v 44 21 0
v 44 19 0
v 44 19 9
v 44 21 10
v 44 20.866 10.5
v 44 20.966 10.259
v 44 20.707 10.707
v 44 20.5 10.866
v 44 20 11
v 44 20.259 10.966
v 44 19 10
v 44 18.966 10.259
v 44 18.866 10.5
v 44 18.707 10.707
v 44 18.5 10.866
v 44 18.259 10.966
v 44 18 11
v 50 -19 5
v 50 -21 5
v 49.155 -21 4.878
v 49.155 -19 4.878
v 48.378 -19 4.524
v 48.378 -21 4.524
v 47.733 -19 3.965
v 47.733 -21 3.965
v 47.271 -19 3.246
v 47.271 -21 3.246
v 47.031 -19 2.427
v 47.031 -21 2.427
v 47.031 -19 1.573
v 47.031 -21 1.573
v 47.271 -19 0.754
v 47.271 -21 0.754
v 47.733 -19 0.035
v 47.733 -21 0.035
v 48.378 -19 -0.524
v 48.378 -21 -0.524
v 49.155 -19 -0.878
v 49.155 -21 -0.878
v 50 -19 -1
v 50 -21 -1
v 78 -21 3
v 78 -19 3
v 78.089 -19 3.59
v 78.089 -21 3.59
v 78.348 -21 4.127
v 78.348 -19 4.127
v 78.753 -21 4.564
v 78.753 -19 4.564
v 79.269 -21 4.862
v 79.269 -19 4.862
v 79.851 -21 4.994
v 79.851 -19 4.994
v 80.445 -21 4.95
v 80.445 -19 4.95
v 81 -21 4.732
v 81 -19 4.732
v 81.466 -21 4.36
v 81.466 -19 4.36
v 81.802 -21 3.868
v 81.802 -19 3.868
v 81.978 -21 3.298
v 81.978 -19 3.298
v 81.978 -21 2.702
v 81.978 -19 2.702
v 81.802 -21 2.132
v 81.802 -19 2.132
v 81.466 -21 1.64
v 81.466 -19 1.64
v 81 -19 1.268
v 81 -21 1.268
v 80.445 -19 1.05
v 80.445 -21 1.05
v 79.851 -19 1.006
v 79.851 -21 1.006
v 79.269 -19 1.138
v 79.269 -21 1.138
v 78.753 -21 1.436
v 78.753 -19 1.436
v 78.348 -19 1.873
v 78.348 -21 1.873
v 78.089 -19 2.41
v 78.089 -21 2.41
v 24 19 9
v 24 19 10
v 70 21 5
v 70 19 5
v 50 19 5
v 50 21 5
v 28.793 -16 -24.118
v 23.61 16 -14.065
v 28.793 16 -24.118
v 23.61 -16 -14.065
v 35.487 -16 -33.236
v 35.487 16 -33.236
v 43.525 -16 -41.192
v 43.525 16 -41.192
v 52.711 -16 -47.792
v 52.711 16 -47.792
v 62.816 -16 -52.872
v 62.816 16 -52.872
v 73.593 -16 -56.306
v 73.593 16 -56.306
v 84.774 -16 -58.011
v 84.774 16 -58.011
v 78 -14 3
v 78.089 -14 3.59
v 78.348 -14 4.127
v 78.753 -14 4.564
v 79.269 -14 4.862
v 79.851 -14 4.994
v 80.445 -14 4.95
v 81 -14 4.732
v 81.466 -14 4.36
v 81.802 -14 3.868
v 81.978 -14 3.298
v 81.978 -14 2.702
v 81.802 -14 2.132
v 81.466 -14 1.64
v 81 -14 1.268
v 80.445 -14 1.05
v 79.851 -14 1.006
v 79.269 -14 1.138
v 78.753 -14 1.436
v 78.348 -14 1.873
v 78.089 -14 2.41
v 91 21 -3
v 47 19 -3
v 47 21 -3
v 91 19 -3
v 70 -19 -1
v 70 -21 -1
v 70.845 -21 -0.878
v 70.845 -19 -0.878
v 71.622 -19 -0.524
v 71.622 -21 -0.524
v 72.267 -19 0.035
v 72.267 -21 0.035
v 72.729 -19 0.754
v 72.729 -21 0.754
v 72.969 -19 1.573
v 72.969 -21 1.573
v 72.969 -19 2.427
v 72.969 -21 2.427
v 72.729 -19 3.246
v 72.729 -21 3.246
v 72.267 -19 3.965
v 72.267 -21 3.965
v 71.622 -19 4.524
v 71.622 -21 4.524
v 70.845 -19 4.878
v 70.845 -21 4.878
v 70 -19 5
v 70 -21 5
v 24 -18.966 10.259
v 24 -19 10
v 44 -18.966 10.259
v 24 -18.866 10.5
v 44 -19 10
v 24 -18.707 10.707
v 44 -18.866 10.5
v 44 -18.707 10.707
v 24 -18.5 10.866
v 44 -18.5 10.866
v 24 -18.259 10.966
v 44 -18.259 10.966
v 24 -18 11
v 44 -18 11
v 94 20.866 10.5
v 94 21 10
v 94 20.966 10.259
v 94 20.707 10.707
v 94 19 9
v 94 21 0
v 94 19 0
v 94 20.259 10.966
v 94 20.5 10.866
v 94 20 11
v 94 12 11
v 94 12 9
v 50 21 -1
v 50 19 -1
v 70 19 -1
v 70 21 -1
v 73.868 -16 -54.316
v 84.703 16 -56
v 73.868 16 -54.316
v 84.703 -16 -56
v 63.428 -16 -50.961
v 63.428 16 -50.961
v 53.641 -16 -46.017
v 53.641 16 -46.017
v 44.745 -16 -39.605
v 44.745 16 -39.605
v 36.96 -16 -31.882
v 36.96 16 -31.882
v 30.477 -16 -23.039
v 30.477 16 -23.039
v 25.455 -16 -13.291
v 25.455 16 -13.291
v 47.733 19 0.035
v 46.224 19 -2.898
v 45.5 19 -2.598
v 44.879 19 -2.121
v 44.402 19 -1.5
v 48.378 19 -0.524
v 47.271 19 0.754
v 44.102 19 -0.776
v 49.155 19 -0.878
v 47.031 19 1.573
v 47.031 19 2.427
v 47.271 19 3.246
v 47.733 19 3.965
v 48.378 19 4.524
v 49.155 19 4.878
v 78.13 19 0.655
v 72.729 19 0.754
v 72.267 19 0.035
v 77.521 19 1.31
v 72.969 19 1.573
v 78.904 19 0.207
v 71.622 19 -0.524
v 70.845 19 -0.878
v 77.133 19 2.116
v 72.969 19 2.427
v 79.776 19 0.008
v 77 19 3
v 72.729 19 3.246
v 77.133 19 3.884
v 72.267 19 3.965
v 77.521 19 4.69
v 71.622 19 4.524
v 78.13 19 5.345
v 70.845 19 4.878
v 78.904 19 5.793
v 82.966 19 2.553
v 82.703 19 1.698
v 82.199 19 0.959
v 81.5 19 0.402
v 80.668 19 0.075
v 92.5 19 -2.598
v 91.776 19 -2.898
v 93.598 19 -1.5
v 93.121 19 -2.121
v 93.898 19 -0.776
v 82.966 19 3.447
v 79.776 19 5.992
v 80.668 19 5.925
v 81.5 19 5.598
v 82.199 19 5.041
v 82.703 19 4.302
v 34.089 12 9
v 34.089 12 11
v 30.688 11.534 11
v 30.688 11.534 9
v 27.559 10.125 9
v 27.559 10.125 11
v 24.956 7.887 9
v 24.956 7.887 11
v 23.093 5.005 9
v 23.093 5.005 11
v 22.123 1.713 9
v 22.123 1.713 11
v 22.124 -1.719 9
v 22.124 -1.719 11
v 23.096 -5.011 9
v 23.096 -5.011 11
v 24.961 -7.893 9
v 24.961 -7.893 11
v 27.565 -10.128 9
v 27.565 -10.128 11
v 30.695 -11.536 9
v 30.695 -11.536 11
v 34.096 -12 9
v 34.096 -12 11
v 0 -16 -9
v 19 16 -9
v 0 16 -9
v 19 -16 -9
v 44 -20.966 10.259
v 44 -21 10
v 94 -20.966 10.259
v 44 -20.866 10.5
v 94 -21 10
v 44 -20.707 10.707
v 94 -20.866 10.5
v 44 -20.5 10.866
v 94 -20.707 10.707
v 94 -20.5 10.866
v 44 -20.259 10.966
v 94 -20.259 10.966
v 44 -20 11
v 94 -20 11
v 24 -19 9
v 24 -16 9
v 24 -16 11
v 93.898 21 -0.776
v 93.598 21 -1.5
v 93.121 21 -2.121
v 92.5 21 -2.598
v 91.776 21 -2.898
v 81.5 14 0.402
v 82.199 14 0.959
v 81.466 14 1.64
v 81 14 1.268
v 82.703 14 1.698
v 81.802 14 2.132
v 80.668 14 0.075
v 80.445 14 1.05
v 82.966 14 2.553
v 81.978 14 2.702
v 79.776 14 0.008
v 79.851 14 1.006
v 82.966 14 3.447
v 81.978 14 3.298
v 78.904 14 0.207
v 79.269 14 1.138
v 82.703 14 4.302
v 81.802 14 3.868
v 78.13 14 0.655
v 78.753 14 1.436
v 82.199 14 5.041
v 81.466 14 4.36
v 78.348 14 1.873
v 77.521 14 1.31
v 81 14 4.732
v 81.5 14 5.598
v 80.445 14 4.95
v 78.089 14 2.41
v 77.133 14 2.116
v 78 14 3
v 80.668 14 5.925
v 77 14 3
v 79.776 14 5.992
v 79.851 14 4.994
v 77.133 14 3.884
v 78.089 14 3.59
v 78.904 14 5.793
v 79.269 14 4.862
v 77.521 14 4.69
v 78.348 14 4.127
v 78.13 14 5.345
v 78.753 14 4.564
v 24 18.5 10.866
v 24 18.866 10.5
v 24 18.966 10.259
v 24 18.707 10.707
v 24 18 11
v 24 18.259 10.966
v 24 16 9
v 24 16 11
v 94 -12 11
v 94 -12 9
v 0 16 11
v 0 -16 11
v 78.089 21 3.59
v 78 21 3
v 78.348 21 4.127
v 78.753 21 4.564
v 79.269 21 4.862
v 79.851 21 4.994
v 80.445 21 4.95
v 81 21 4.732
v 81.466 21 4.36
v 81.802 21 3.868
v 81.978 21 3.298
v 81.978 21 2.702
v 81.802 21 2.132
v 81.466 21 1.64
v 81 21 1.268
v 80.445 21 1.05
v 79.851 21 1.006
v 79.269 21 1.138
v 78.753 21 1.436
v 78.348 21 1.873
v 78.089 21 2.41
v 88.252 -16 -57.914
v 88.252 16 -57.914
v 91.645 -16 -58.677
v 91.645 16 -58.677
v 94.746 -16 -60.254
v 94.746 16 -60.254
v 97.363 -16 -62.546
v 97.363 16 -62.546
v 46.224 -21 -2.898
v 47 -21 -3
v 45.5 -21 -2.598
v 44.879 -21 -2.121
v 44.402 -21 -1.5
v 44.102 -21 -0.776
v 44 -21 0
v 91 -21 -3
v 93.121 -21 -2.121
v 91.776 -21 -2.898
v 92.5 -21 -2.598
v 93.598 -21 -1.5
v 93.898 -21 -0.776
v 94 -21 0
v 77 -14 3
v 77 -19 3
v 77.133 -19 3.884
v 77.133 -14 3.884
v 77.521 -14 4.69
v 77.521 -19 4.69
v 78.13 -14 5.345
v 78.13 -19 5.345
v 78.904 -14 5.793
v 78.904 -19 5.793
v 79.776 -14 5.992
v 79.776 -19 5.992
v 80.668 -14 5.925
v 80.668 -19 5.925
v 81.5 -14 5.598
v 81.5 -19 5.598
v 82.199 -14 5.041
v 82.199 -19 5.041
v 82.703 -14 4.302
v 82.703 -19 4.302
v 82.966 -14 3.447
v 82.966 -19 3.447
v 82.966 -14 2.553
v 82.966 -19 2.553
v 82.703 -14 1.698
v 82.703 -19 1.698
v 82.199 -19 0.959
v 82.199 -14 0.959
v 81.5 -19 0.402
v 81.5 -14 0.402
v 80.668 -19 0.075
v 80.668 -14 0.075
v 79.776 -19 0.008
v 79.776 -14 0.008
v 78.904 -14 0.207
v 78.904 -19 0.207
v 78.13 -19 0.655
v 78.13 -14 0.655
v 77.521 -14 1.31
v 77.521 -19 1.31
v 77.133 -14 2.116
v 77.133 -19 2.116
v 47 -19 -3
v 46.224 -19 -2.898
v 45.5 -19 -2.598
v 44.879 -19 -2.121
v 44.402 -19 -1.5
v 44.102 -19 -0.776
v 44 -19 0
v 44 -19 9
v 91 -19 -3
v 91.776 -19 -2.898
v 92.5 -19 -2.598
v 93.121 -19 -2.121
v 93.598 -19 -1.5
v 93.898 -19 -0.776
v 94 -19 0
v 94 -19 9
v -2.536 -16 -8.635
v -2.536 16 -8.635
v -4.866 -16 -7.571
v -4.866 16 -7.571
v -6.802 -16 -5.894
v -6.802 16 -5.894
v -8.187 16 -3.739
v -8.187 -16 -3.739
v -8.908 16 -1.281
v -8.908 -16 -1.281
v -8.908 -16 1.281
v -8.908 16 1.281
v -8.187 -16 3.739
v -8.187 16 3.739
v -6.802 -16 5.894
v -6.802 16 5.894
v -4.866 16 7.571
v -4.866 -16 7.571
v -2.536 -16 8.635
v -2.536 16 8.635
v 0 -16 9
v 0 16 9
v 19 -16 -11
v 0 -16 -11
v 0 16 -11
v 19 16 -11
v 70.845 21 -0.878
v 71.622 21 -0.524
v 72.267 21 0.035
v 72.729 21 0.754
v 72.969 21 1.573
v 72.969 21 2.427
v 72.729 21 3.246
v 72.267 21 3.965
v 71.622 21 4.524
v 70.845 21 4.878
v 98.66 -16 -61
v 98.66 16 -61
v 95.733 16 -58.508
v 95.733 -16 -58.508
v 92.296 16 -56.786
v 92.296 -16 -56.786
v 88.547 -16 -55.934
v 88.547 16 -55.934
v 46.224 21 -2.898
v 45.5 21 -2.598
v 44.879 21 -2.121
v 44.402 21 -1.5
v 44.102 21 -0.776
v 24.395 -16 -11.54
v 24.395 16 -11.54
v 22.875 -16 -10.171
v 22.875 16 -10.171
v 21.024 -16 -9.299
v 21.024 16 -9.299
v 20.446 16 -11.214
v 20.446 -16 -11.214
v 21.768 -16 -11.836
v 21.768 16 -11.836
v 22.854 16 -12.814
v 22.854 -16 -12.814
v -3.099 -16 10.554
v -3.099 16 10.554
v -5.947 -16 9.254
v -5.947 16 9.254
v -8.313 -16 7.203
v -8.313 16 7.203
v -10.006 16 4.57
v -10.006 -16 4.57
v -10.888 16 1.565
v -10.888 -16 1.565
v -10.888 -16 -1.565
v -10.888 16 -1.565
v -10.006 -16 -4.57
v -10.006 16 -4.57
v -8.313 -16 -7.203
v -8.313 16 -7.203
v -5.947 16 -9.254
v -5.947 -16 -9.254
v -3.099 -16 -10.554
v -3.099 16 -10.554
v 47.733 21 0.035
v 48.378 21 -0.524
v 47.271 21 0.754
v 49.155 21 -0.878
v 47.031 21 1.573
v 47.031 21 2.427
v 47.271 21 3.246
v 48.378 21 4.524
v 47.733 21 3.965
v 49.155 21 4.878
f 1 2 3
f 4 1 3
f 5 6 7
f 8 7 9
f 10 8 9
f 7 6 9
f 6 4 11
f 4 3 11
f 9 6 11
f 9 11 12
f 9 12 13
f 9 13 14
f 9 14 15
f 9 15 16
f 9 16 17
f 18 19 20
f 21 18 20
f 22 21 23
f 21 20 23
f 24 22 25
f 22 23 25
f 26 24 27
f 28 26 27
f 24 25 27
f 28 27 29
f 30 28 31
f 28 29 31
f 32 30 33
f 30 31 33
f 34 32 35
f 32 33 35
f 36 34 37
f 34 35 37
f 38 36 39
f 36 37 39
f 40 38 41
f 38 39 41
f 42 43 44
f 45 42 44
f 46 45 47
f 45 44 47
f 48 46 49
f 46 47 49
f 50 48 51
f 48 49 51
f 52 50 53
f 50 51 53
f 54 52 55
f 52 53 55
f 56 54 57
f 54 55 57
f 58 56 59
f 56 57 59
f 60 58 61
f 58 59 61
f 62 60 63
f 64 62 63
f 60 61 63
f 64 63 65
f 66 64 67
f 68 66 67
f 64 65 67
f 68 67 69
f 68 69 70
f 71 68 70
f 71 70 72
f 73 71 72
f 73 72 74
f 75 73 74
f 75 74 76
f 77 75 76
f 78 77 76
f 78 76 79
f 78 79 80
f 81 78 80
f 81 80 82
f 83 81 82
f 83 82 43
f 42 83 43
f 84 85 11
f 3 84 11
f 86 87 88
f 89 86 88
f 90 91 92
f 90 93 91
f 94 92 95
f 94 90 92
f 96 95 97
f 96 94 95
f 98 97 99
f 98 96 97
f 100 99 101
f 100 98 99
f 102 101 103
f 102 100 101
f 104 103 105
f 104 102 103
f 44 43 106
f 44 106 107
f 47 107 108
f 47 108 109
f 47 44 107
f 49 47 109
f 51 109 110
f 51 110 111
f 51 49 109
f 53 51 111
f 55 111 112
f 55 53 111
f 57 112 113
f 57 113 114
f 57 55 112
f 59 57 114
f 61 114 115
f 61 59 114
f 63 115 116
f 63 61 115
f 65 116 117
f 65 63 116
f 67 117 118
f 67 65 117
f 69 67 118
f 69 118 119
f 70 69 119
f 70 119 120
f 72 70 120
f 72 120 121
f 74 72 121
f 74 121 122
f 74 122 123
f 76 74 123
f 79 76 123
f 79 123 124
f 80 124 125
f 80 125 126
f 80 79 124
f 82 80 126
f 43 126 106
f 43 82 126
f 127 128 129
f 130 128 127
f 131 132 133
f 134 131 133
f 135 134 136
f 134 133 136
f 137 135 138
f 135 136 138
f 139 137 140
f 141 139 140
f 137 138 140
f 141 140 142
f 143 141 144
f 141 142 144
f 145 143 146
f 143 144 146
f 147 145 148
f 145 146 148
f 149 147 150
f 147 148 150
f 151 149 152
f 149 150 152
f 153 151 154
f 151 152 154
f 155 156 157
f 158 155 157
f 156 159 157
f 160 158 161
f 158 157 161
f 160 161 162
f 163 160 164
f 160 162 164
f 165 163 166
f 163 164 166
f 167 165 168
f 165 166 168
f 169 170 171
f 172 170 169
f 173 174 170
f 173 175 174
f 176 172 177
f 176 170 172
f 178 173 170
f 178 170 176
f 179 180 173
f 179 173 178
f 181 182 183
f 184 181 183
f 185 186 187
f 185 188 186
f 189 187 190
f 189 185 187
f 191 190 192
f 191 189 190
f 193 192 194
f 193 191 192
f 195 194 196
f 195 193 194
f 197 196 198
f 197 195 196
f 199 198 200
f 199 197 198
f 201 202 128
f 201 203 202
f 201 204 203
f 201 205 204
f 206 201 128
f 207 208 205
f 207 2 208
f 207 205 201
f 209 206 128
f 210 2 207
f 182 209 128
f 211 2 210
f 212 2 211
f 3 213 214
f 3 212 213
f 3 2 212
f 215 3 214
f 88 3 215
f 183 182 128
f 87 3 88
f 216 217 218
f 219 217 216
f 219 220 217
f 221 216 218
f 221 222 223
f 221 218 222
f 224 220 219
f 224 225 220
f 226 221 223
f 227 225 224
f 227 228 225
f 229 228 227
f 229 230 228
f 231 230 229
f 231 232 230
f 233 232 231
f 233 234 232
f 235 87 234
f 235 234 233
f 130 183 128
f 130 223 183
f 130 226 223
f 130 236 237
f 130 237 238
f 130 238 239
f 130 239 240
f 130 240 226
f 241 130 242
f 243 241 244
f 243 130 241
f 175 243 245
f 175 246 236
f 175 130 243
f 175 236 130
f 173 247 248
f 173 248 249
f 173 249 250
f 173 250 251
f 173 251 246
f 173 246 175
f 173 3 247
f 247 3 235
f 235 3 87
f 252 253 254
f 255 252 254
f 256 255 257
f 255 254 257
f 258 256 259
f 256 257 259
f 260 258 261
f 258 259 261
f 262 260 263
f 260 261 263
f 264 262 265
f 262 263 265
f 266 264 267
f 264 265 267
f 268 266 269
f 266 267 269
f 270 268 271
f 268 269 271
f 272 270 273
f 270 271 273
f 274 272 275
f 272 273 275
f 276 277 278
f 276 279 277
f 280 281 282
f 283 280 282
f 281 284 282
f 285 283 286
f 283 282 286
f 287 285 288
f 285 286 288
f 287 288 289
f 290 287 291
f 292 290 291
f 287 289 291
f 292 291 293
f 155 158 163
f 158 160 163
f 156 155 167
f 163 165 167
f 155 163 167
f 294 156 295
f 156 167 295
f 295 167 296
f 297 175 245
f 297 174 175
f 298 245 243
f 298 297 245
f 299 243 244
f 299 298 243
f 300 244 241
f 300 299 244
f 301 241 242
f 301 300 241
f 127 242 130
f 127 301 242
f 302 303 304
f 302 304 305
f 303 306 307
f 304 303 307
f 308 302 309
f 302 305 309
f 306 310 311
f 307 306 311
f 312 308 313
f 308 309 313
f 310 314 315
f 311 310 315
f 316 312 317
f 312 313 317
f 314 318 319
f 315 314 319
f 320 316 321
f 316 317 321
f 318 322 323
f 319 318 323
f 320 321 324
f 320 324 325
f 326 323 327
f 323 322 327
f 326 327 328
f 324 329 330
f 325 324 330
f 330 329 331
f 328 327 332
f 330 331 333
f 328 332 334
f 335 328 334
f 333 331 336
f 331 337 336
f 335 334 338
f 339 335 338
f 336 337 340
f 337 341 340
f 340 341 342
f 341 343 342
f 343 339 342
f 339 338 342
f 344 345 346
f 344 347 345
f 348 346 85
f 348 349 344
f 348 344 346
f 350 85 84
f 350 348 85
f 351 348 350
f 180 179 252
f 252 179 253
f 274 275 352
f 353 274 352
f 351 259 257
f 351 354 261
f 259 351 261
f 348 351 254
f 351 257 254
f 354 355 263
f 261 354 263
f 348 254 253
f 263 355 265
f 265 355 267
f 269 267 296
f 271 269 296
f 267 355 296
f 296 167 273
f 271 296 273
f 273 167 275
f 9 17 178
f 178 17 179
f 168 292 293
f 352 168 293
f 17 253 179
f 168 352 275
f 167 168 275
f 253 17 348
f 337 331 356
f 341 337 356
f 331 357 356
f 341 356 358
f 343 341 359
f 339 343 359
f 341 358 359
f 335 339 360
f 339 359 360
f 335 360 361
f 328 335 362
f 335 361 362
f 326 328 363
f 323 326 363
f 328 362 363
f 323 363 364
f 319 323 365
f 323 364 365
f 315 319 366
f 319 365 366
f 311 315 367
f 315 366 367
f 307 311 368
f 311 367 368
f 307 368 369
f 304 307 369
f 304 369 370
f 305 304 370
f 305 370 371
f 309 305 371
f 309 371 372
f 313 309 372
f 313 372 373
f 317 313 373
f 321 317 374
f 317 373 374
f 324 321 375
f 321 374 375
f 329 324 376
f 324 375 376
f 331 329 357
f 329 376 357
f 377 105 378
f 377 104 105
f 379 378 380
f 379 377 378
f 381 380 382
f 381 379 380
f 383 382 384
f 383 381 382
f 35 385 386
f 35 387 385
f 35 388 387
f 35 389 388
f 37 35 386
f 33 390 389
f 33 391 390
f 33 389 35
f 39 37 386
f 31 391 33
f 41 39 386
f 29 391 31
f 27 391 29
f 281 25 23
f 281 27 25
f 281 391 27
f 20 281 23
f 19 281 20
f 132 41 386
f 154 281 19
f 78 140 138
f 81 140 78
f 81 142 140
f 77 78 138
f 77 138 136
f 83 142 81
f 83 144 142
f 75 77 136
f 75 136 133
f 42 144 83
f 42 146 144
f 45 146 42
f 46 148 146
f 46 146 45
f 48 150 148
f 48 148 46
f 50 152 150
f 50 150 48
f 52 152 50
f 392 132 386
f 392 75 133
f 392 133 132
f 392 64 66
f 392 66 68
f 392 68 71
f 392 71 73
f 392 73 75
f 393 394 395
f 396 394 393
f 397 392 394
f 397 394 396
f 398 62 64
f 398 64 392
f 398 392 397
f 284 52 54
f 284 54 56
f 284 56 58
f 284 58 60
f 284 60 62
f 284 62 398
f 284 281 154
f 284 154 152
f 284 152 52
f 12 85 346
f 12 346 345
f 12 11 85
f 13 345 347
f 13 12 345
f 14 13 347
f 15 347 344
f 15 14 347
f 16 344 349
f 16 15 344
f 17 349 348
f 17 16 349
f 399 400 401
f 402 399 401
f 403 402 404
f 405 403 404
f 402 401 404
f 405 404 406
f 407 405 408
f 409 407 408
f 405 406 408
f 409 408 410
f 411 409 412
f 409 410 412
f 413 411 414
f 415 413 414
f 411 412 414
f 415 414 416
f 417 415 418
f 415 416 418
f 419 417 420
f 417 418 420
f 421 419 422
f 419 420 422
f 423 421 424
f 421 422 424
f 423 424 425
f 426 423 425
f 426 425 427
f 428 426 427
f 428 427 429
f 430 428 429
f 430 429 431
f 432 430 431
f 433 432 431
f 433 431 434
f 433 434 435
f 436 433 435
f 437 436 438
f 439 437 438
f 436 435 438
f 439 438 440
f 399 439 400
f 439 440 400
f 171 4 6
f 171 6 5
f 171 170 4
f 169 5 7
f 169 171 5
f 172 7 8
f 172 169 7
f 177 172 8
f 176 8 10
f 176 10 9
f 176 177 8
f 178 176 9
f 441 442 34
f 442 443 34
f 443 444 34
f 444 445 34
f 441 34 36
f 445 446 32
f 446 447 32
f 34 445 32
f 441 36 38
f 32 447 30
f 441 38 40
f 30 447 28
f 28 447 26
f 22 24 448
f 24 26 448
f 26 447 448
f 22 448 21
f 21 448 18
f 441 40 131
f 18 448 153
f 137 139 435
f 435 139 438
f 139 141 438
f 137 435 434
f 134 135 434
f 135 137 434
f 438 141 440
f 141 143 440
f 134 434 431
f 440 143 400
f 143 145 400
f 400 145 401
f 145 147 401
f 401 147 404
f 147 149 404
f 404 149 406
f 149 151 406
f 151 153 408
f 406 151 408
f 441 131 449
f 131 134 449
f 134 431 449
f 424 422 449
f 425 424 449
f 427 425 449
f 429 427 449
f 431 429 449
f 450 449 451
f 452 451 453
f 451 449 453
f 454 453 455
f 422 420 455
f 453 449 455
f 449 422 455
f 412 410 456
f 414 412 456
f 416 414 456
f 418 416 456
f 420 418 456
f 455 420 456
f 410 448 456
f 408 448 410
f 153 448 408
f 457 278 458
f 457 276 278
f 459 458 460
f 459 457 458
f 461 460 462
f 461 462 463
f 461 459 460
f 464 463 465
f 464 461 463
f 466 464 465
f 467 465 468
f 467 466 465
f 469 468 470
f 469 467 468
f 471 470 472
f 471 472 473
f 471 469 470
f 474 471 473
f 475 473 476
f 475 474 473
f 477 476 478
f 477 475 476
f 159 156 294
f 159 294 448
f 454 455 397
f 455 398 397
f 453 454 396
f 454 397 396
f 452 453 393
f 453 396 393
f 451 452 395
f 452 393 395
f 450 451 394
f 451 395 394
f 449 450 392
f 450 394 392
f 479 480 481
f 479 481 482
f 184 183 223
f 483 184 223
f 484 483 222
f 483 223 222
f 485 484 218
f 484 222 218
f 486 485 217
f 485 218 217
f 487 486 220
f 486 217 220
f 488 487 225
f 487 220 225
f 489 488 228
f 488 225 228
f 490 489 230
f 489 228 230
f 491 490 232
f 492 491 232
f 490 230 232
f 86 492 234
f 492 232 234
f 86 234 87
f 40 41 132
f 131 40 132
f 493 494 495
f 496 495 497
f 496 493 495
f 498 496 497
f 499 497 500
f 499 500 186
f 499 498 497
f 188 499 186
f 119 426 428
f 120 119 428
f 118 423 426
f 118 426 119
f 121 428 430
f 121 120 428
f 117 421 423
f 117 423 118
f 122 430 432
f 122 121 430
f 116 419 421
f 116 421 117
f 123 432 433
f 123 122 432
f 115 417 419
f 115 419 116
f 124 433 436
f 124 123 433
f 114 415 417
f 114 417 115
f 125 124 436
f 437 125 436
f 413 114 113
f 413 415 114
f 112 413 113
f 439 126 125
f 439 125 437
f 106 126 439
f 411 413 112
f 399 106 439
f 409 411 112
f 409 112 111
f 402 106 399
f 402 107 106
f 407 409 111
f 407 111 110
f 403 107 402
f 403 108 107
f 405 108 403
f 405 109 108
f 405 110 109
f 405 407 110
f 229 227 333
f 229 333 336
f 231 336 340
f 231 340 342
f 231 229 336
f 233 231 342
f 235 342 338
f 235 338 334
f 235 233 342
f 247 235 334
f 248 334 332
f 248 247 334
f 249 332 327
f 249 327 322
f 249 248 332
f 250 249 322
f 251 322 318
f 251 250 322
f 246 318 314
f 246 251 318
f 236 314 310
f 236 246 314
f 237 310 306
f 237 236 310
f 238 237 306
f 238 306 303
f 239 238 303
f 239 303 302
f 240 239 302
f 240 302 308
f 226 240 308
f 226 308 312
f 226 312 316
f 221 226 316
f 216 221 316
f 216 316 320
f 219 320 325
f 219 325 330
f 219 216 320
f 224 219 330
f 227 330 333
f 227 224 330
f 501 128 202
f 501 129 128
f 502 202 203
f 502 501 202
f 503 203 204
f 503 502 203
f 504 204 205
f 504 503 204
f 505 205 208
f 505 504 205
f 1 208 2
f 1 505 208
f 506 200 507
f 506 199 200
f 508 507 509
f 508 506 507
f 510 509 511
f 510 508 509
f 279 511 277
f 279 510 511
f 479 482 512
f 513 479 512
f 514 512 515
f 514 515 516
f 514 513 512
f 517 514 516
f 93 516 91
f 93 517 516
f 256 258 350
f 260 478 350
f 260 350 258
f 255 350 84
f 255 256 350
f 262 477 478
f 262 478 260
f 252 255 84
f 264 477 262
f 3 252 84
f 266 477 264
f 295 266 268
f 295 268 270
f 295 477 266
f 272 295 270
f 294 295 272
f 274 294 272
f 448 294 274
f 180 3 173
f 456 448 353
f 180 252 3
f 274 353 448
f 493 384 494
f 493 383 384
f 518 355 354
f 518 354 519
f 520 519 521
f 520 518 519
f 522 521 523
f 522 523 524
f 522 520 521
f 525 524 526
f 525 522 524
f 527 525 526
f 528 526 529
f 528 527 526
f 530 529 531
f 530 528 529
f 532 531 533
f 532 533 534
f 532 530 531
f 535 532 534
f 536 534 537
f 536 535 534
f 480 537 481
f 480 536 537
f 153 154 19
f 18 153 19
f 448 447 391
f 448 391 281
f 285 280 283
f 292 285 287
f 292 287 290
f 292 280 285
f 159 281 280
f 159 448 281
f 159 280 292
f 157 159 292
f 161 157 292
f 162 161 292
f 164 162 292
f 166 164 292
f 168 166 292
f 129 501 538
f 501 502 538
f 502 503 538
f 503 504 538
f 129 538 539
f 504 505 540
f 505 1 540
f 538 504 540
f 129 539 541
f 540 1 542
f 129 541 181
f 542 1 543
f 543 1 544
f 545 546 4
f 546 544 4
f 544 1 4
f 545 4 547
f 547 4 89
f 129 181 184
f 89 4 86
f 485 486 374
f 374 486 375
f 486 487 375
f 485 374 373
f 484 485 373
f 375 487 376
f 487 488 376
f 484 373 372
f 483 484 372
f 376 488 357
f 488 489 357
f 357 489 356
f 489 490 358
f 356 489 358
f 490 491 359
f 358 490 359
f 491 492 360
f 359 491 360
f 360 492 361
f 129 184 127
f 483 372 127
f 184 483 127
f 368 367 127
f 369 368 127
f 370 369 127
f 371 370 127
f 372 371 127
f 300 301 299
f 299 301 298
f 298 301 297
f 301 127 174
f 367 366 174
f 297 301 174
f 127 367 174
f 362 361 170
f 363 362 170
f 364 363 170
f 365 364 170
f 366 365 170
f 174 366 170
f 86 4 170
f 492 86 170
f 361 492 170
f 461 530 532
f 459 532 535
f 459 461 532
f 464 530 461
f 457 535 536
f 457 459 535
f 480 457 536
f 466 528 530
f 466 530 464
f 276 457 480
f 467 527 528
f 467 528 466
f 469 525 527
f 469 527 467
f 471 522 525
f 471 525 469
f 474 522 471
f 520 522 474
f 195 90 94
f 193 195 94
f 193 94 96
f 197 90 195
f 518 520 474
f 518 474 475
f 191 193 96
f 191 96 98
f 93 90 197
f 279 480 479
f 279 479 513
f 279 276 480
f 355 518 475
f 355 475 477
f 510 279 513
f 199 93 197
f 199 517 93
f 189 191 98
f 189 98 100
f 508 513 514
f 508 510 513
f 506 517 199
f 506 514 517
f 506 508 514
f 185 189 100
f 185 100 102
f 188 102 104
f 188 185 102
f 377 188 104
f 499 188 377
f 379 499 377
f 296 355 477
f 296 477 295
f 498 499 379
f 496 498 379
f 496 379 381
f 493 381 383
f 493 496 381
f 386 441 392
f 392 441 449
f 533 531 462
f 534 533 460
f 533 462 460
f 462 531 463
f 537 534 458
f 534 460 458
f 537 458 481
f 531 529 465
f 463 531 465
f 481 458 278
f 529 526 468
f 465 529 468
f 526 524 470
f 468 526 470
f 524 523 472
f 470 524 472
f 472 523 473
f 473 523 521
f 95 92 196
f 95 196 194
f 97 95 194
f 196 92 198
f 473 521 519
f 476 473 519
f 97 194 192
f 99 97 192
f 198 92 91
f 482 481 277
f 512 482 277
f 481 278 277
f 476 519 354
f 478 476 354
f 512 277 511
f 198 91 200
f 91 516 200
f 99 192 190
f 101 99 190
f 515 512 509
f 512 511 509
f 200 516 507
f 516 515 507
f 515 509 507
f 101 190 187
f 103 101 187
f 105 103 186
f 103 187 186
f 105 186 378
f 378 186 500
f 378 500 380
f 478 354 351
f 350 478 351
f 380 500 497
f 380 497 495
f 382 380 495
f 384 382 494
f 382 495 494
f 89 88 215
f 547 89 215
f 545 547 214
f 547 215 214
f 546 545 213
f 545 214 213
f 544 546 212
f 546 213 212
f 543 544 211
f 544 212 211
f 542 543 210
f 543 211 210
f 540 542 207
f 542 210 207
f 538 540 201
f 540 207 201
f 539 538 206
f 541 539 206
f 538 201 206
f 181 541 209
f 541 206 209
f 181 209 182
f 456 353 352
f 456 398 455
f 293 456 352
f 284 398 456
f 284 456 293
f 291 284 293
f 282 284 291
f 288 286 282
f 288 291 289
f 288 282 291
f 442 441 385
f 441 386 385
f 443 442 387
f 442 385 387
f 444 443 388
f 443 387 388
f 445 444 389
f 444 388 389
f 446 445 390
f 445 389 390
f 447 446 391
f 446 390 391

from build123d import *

# Parameters (mm, degrees)
F1_DEPTH  = 16
F2_W      = 70
F2_H      = 3
F3_DEPTH  = 2
F4_W      = 50
F4_H      = 14
F5_DEPTH  = 2
F6_R      = 1
F9_DEPTH  = 2
F11_DEPTH = 42.001
F13_D     = 4
F14_R     = 3
F14_R_2   = 2
F15_DEPTH = 5
F16_R     = 3


# Not quite as in the source:
# - a pattern or mirror of a feature is missing from the dataset's text; its kind, count and spacing are read off the source's solid


with BuildPart() as f1:
    # F0 (on Front) → F1 (new body)
    with BuildSketch(Plane.XZ):
        with BuildLine():
            Line((94, 11), (0, 11))
            ThreePointArc((0, 11), (-11, 0), (0, -11))
            Line((0, -11), (19, -11))
            ThreePointArc((19, -11), (21.7681124643, -11.8361612201), (23.6103896104, -14.064978646))
            ThreePointArc((23.6103896104, -14.064978646), (47.9882051962, -44.6729645648), (84.7744660979, -58.0107943585))
            ThreePointArc((84.7744660979, -58.0107943585), (91.6454906811, -58.677418602), (97.362645896, -62.5464627931))
            Line((97.362645896, -62.5464627931), (98.6602822553, -61))
            ThreePointArc((98.6602822553, -61), (92.2959119196, -56.7859373435), (84.7034264019, -56))
            ThreePointArc((84.7034264019, -56), (49.0672193413, -42.9854179344), (25.4545454545, -13.2909701044))
            ThreePointArc((25.4545454545, -13.2909701044), (22.87535745, -10.1706257081), (19, -9))
            Line((19, -9), (0, -9))
            ThreePointArc((0, -9), (-9, 0), (0, 9))
            Line((0, 9), (94, 9))
            Line((94, 9), (94, 11))
        make_face()
    extrude(amount=F1_DEPTH)

    # F2 (on face) → F3 (join)
    with BuildSketch(Plane.XY.offset(11)):
        with Locations((59, -17.5)):
            Rectangle(F2_W, F2_H)
    extrude(amount=-F3_DEPTH)

    # F4 (on face) → F5 (join)
    with BuildSketch(Plane.XZ.offset(19)):
        with Locations((69, 4)):
            Rectangle(F4_W, F4_H)
    extrude(amount=F5_DEPTH)

    # F6
    f6_edges = [f1.edges().sort_by_distance(p)[0] for p in [
        (69, -21, 11),
        (34, -19, 11),
    ]]
    fillet(f6_edges, radius=F6_R)

    # F7: F1 across plane


with BuildPart() as f1_1:
    add(f1.part)
    add(f1.part.mirror(Plane.XZ))

    # F8 (on face) → F9 (cut)
    with BuildSketch(Plane.XY.offset(11)):
        with BuildLine():
            Line((94, 11.9996714485), (34.088798243, 11.9996714485))
            ThreePointArc((34.088798243, 11.9996714485), (22.0000004897, -0.003428249), (34.0956545385, -11.9996187527))
            Line((34.0956545385, -11.9996187527), (94, -11.9996187527))
            Line((94, -11.9996187527), (94, 11.9996714485))
        make_face()
    extrude(amount=-F9_DEPTH, mode=Mode.SUBTRACT)

    # F10 (on face) → F11 (cut, through all)
    with BuildSketch(Plane.XZ.offset(21)):
        with BuildLine():
            ThreePointArc((50, 5), (47, 2), (50, -1))
            Line((50, -1), (70, -1))
            ThreePointArc((70, -1), (73, 2), (70, 5))
            Line((70, 5), (50, 5))
        make_face()
    extrude(amount=-F11_DEPTH, mode=Mode.SUBTRACT)

    # F13 (through all)
    with Locations(Plane.XZ.offset(21)):
        with Locations((80, 3)):
            Hole(F13_D / 2)

    # F14 (on face) → F15 (join)
    with BuildSketch(Plane(origin=(0, -19, 0), x_dir=(-1, 0, 0), z_dir=(0, 1, 0))):
        with Locations((-80, 3)):
            Circle(F14_R)
        with Locations((-80, 3)):
            Circle(F14_R_2, mode=Mode.SUBTRACT)
    f15 = extrude(amount=F15_DEPTH)

    # F15_copies: F15 across plane
    add(f15.mirror(Plane.ZX))

    # F16
    f16_edges = [f1_1.edges().sort_by_distance(p)[0] for p in [
        (44, 20, -3),
        (94, 20, -3),
        (94, -20, -3),
        (44, -20, -3),
    ]]
    fillet(f16_edges, radius=F16_R)


solid = f1_1.part
